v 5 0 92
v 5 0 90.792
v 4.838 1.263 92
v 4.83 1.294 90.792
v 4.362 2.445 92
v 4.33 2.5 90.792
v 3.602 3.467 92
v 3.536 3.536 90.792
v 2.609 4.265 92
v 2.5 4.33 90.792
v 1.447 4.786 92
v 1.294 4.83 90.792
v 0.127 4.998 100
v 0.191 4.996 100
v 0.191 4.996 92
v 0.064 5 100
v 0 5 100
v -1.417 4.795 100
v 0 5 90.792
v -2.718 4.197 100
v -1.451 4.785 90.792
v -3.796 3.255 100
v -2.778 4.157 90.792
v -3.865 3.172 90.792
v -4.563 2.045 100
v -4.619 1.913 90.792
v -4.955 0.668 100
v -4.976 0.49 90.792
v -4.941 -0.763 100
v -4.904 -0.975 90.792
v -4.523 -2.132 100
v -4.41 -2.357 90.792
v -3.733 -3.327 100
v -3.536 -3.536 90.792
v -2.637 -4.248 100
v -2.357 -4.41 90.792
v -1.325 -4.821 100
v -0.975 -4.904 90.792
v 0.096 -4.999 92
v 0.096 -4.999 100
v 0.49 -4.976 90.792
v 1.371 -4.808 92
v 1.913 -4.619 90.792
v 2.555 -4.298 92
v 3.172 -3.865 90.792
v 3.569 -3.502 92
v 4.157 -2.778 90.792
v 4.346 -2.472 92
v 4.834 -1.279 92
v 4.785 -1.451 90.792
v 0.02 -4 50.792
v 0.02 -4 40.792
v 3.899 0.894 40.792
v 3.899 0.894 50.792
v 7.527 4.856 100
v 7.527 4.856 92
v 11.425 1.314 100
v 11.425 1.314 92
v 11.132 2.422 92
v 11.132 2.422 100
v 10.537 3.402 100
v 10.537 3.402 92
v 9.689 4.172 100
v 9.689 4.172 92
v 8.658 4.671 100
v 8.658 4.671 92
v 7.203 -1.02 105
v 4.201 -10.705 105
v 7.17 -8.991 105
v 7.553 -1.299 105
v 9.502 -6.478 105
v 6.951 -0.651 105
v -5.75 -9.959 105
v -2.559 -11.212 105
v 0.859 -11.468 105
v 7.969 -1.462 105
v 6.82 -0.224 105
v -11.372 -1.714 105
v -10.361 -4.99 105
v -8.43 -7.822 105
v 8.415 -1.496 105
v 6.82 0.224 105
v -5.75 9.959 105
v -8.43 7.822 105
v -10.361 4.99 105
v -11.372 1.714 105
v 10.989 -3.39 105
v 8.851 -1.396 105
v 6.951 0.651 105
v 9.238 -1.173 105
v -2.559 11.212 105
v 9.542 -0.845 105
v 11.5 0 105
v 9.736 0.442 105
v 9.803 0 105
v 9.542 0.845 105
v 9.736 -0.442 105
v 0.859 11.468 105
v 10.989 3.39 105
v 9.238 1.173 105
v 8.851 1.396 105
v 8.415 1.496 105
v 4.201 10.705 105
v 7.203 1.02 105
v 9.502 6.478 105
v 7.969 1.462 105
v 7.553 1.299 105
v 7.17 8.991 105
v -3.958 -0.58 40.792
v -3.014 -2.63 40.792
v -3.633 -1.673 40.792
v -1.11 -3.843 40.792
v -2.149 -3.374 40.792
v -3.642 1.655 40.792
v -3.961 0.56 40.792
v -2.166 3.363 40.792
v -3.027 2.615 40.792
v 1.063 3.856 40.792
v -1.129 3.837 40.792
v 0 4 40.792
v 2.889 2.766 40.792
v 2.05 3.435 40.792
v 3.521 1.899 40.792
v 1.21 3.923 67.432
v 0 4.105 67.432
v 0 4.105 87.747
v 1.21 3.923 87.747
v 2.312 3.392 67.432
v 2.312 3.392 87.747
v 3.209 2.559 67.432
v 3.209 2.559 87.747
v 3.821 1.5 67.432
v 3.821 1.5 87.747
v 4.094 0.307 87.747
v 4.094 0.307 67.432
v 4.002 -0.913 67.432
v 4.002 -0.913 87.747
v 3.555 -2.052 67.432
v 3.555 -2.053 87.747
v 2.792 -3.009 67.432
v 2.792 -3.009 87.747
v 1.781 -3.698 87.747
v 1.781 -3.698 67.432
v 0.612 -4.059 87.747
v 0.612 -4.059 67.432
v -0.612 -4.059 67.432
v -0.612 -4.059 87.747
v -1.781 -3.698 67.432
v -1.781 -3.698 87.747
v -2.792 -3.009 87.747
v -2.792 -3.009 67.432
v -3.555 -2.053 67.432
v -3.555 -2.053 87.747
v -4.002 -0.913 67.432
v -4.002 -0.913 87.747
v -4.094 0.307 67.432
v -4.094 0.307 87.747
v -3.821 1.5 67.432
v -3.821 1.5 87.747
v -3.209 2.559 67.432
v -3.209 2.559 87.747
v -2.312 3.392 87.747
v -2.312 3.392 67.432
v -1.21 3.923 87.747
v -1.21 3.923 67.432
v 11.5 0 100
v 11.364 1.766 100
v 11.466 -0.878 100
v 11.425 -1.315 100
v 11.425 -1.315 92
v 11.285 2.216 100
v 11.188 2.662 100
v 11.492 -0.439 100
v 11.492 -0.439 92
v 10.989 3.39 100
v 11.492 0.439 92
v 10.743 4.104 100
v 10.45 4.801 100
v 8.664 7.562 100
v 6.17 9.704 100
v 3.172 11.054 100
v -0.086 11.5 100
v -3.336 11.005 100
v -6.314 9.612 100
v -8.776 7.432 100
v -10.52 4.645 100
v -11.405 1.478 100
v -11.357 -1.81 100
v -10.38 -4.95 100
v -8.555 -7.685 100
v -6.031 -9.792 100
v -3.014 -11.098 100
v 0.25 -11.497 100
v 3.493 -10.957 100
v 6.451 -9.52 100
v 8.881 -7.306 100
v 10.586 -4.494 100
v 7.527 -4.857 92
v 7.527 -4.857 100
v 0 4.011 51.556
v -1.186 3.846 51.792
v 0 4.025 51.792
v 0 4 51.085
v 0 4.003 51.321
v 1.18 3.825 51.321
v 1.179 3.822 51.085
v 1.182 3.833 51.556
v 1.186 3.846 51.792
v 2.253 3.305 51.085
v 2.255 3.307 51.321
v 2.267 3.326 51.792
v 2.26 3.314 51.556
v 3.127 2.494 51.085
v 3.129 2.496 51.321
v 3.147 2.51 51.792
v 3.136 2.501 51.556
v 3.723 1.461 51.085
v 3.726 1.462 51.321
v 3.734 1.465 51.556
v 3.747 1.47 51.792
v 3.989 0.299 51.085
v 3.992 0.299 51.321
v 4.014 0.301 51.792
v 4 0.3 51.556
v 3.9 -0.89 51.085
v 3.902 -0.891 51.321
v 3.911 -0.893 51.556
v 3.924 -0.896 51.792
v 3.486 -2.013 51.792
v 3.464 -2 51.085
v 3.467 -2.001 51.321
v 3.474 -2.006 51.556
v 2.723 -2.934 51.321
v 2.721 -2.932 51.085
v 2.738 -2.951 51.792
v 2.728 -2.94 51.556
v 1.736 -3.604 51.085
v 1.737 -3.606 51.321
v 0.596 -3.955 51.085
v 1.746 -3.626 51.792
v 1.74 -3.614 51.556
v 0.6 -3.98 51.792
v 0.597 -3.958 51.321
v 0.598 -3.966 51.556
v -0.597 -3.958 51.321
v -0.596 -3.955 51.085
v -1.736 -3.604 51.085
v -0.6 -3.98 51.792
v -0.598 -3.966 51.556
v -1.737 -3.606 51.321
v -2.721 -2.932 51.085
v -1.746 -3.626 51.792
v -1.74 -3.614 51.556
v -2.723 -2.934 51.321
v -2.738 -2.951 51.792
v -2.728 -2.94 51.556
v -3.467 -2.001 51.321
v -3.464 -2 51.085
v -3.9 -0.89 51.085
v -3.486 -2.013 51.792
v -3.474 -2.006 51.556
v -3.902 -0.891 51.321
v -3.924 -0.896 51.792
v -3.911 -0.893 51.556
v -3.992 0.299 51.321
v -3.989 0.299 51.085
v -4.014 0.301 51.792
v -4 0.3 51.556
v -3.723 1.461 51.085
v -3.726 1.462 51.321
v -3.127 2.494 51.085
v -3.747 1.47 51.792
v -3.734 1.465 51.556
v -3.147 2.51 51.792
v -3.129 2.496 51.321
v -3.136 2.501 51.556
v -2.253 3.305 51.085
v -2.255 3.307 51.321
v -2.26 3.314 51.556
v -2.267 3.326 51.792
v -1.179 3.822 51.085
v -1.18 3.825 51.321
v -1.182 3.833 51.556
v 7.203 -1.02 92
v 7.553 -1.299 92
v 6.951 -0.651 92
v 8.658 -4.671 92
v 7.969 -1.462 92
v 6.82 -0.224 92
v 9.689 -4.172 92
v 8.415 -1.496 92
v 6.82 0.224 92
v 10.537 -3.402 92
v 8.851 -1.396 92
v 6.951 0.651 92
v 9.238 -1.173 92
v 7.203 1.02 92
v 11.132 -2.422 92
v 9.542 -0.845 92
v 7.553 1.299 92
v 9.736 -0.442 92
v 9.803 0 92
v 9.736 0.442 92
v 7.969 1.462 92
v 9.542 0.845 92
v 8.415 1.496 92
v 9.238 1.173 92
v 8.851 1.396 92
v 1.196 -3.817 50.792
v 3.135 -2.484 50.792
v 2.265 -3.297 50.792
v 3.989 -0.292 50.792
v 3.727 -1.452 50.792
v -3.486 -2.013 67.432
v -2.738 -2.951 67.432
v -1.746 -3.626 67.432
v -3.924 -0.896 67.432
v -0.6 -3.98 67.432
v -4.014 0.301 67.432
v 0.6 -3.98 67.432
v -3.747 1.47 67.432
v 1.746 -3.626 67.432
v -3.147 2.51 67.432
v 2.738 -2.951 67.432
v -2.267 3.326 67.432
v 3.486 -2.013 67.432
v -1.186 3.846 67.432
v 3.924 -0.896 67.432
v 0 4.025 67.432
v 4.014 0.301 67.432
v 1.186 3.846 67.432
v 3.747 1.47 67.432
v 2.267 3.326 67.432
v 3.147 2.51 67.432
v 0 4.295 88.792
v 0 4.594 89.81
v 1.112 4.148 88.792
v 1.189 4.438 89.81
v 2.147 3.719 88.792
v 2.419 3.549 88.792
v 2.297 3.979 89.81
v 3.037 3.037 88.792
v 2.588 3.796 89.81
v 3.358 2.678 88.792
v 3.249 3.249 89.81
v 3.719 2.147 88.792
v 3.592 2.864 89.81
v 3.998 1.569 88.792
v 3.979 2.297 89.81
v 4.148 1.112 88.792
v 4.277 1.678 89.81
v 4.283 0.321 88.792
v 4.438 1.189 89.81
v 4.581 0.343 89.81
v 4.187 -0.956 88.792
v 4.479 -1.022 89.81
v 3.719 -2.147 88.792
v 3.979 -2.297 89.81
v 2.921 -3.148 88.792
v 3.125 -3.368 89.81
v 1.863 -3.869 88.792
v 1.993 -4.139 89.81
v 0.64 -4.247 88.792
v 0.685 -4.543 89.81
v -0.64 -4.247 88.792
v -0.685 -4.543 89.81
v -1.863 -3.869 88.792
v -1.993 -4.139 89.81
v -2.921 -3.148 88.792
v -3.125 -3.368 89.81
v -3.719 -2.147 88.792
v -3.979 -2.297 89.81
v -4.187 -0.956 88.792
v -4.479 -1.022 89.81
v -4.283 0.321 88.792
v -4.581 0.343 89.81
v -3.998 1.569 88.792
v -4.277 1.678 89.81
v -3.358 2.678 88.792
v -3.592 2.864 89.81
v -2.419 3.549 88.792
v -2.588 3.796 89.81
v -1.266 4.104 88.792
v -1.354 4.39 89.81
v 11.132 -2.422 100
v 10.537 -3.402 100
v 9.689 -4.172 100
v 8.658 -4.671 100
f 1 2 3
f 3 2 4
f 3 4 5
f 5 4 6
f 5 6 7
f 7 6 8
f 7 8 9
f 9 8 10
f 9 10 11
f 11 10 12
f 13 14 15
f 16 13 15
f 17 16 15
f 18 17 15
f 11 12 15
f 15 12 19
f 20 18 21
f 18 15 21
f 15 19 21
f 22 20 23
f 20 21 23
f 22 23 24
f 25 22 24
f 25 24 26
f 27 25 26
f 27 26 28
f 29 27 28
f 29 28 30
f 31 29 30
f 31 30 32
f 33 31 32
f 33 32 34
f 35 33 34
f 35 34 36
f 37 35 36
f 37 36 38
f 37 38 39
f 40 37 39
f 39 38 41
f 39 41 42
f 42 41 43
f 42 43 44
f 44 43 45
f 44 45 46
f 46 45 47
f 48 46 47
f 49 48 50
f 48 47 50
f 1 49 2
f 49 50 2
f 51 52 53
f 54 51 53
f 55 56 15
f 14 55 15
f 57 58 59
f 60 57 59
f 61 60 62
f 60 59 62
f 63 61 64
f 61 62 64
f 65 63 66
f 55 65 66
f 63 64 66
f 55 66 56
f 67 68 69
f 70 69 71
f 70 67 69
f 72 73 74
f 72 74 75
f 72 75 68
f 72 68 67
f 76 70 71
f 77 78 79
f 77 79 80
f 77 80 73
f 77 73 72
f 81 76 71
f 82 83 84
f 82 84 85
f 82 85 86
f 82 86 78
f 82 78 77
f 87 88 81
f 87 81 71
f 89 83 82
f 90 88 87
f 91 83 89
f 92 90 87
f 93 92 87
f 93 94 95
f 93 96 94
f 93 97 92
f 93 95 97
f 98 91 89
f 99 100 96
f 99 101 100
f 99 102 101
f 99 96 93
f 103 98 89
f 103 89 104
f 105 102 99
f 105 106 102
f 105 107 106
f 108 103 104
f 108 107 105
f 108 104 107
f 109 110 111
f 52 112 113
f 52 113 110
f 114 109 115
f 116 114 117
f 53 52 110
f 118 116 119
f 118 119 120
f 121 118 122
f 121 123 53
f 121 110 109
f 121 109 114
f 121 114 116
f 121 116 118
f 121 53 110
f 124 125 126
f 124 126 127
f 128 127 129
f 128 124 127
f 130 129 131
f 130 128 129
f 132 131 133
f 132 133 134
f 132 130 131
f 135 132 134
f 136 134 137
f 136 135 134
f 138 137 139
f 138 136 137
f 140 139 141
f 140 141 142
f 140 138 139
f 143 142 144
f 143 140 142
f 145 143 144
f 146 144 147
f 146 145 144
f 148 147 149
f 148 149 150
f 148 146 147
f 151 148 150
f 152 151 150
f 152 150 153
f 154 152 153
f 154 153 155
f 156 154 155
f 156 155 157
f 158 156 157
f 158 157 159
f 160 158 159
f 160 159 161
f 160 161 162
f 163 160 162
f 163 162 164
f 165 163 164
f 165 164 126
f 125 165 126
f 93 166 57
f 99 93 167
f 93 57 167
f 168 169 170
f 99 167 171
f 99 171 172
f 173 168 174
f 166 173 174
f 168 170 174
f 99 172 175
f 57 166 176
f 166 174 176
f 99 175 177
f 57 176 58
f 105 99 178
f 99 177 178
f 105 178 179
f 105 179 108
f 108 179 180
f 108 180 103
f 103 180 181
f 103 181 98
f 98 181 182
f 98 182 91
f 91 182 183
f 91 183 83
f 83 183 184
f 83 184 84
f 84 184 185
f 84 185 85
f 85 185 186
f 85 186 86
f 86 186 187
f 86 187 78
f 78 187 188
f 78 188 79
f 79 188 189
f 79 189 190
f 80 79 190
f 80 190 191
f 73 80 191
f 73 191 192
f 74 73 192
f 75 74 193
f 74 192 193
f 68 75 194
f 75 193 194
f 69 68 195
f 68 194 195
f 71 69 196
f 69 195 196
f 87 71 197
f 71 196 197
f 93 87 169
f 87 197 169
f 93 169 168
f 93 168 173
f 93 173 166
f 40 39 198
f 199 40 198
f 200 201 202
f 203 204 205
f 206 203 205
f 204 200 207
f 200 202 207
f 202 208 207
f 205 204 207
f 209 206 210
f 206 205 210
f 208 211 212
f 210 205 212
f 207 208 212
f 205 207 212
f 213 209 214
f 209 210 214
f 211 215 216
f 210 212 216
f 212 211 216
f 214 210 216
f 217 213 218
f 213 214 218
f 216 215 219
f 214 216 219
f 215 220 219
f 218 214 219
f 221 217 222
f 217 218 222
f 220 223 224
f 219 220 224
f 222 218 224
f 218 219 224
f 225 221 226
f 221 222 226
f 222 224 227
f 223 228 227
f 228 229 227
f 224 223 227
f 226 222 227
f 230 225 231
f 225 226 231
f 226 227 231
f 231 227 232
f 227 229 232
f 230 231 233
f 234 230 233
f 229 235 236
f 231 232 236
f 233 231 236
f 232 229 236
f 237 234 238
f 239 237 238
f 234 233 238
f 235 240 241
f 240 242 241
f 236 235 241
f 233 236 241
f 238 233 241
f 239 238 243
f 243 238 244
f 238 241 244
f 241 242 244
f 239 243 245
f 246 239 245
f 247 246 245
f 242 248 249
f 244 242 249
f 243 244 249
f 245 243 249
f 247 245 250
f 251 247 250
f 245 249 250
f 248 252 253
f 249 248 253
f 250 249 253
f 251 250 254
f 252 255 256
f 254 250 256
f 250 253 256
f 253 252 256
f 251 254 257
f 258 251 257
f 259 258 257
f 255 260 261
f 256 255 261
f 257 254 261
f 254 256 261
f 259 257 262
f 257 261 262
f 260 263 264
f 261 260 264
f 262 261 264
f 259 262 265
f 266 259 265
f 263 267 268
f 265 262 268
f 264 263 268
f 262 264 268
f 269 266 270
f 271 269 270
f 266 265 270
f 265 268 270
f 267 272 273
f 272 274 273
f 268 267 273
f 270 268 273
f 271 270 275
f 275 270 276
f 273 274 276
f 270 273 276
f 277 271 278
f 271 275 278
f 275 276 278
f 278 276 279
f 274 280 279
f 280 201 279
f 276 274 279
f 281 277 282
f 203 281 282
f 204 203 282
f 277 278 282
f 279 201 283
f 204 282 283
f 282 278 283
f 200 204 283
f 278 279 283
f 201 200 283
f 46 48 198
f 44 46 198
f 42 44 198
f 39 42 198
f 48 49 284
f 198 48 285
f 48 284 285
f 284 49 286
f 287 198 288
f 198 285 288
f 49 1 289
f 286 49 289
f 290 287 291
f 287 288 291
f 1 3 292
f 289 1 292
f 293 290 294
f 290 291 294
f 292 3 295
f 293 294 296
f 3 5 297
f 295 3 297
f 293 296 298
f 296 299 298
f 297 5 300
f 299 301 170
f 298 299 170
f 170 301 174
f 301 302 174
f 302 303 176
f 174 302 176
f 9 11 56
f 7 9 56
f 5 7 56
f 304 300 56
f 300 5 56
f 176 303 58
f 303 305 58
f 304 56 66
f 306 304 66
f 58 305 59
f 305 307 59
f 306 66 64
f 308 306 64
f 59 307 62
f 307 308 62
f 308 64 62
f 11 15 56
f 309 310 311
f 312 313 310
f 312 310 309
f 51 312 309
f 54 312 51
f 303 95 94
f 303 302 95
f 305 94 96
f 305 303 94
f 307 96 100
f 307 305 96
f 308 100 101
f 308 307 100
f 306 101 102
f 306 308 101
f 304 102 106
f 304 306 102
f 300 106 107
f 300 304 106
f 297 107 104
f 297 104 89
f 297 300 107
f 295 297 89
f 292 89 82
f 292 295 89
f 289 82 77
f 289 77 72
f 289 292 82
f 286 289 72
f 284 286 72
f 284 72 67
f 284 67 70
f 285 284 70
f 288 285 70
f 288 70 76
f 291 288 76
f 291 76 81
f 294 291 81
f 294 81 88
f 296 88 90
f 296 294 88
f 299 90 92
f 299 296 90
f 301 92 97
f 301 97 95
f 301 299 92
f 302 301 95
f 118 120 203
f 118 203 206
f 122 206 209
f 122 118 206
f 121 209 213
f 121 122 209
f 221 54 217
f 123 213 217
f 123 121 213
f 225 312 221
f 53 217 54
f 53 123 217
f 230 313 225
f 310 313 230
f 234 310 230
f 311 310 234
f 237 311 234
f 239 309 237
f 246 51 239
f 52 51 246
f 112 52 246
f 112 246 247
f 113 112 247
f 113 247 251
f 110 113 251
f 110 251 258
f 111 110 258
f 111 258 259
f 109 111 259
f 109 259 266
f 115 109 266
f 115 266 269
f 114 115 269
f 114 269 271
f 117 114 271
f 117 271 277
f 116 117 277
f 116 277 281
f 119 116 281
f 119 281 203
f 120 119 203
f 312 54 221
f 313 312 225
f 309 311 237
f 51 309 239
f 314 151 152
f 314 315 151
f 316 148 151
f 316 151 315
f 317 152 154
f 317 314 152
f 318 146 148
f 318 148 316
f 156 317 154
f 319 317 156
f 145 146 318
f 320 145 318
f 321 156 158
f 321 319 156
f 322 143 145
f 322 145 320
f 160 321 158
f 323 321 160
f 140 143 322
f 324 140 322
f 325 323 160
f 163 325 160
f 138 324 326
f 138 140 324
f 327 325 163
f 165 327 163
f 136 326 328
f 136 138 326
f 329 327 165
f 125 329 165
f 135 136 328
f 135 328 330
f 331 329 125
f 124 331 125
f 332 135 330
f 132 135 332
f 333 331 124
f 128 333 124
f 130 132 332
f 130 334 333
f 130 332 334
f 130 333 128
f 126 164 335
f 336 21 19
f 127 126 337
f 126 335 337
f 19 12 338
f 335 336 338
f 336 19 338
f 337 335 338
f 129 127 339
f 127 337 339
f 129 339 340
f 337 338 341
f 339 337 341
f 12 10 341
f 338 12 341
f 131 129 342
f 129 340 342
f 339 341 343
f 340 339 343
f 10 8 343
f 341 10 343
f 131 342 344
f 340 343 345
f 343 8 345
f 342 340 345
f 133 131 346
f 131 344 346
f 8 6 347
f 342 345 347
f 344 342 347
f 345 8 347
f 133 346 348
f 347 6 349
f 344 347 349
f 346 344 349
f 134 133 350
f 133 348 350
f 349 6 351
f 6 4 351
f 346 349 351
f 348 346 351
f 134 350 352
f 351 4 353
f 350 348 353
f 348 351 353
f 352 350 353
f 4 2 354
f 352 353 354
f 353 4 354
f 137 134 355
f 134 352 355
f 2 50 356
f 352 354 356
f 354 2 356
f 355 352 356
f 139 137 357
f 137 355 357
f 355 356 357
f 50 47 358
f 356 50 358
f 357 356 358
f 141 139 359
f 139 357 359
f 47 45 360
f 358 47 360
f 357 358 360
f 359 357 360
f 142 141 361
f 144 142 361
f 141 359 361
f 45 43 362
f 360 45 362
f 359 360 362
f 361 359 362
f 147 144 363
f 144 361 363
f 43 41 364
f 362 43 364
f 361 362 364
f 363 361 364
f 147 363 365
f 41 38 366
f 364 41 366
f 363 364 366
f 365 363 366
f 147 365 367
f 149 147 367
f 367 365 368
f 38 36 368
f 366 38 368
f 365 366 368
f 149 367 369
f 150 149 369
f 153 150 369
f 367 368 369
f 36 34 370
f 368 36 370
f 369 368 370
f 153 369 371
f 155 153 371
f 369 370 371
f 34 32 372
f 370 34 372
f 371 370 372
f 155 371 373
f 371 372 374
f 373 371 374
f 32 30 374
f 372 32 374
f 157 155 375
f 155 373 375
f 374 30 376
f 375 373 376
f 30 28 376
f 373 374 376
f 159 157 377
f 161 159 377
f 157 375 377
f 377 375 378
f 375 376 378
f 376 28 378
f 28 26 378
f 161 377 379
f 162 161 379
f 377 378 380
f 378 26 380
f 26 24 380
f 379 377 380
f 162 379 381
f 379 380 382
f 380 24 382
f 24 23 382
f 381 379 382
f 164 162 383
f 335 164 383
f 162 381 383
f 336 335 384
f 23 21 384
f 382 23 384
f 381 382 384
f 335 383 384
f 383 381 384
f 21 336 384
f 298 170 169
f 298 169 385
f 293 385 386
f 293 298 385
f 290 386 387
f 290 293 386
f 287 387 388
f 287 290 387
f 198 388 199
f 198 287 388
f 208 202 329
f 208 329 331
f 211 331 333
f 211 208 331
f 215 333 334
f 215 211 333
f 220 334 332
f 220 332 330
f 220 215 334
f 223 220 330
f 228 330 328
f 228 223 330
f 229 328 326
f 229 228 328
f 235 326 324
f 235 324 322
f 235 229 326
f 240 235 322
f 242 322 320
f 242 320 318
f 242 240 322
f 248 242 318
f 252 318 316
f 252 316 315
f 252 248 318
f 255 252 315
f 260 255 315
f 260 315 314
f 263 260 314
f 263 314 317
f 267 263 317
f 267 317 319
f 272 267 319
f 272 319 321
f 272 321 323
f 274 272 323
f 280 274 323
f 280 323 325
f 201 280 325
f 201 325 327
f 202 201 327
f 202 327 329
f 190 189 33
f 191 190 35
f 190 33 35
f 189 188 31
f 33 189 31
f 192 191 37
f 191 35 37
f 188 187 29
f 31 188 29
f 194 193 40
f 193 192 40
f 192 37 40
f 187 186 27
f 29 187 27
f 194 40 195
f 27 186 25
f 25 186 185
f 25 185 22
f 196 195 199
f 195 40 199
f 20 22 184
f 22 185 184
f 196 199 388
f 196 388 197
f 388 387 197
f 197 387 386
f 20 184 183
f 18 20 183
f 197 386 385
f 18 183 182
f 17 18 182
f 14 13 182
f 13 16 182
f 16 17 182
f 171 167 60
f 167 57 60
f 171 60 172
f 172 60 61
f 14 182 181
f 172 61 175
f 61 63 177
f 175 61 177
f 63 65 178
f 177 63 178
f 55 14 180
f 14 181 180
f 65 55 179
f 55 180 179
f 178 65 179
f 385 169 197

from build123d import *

# Parameters (mm, degrees)
SKETCH1_R               = 5
BOSS_EXTRUDE1_DEPTH     = 100
SKETCH2_R               = 11.5
BOSS_EXTRUDE2_DEPTH     = 5
SKETCH3_R               = 1.5
BOSS_EXTRUDE3_DEPTH     = 5
BOSS_EXTRUDE4_START     = 8
BOSS_EXTRUDE4_DEPTH     = 8
CUT_EXTRUDE2_DEPTH      = 8
CUT_EXTRUDE4_DEPTH      = 134.839635872
CUT_EXTRUDE4_DEPTH_BACK = 134.839635872
SKETCH7_W               = 13.423809299
SKETCH7_H               = 65.791523209
CUT_EXTRUDE5_DEPTH      = 48.105089111
CUT_EXTRUDE5_DEPTH_BACK = 48.105089111
SKETCH8_R               = 1.5
SKETCH9_R               = 5
SKETCH9_R_2             = 4.025
CUT_EXTRUDE6_DEPTH      = 25
FILLET1_R               = 10
BOSS_EXTRUDE5_START     = 25
SKETCH10_R              = 4.025
BOSS_EXTRUDE5_DEPTH     = 25
CUT_EXTRUDE7_DEPTH      = 10
SKETCH12_R              = 4.025
SKETCH12_R_2            = 4
CUT_EXTRUDE8_DEPTH      = 11
FILLET2_R               = 10
SKETCH13_R              = 4.105
SKETCH13_R_2            = 4.025
BOSS_EXTRUDE6_DEPTH     = 20
BOSS_EXTRUDE7_START     = 5
SKETCH14_R              = 4.105
BOSS_EXTRUDE7_DEPTH     = 5


with BuildPart() as part:
    # Sketch1 → Boss-Extrude1 (new body)
    with BuildSketch(Plane.XY):
        Circle(SKETCH1_R)
    extrude(amount=BOSS_EXTRUDE1_DEPTH)

    # Sketch2 → Boss-Extrude2 (add)
    with BuildSketch(Plane.XY.offset(100)):
        Circle(SKETCH2_R)
    extrude(amount=BOSS_EXTRUDE2_DEPTH)

    # Sketch3 → Boss-Extrude3 (add)
    with BuildSketch(Plane.XY.offset(105)):
        with Locations((8.302947015, 0)):
            Circle(SKETCH3_R)
    extrude(amount=BOSS_EXTRUDE3_DEPTH)

    # Sketch5 → Boss-Extrude4 (add)
    with BuildSketch(Plane(origin=(0, 0, 100), x_dir=(-1, 0, 0), z_dir=(0, 0, -1)).offset(BOSS_EXTRUDE4_START)):
        with BuildLine():
            Line((-10.45001903, 4.800739762), (0, 5))
            ThreePointArc((0, 5), (4.99977072, -0.04788268), (-0.095760969, -4.9990829))
            Line((-0.095760969, -4.9990829), (-10.45001903, -4.800739762))
            ThreePointArc((-10.45001903, -4.800739762), (-11.5, 0), (-10.45001903, 4.800739762))
        make_face()
    extrude(amount=-BOSS_EXTRUDE4_DEPTH)

    # Sketch6 → Cut-Extrude2 (cut)
    with BuildSketch(Plane(origin=(0, 0, 92), x_dir=(-1, 0, 0), z_dir=(0, 0, -1))):
        with BuildLine():
            ThreePointArc((-11.187749919, 2.661625773), (-11.326245042, 1.991525355), (-11.424640936, 1.314374177))
            ThreePointArc((-11.424640936, 1.314374177), (-10.141082355, 3.817380419), (-7.527110609, 4.856473577))
            Line((-7.527110609, 4.856473577), (-10.45001903, 4.800739762))
            ThreePointArc((-10.45001903, 4.800739762), (-10.871624232, 3.749371489), (-11.187749919, 2.661625773))
        make_face()
        with BuildLine():
            ThreePointArc((-11.424595573, -1.314768419), (-10.141131578, -3.817565911), (-7.527431975, -4.856723984))
            Line((-7.527431975, -4.856723984), (-10.45001903, -4.800739762))
            ThreePointArc((-10.45001903, -4.800739762), (-11.07531896, -3.09633815), (-11.424595573, -1.314768419))
        make_face()
    extrude(amount=-CUT_EXTRUDE2_DEPTH, mode=Mode.SUBTRACT)

    # Sketch7 → Cut-Extrude4 (cut, two sides: drawn at the far end of the back side and taken through both)
    with BuildSketch(Plane(origin=(-96.480203858, -4.620399557, 77.417416795), x_dir=(0.40721461787547164, -0.9133324996892062, 6.240488345448587e-15), z_dir=(0.9133324996892062, 0.40721461787547164, -3.9305527970726e-15)).offset(-CUT_EXTRUDE4_DEPTH_BACK)):
        with Locations((36.58009292, 44.521655191)):
            Rectangle(SKETCH7_W, SKETCH7_H)
    extrude(amount=CUT_EXTRUDE4_DEPTH + CUT_EXTRUDE4_DEPTH_BACK, mode=Mode.SUBTRACT)

    # Sketch8 → Cut-Extrude5 (cut, two sides: drawn at the far end of the back side and taken through both)
    with BuildSketch(Plane.XY.offset(110).offset(-CUT_EXTRUDE5_DEPTH_BACK)):
        with Locations((8.302947015, 0)):
            Circle(SKETCH8_R)
    extrude(amount=CUT_EXTRUDE5_DEPTH + CUT_EXTRUDE5_DEPTH_BACK, mode=Mode.SUBTRACT)

    # Sketch9 → Cut-Extrude6 (cut)
    with BuildSketch(Plane(origin=(0, 0, 65.791523209), x_dir=(-1, 0, 0), z_dir=(0, 0, -1))):
        with Locations(Location((0, 0, 0), (0, 0, 90))):
            Circle(SKETCH9_R)
        with Locations(Location((0, 0, 0), (0, 0, 90))):
            Circle(SKETCH9_R_2, mode=Mode.SUBTRACT)
    extrude(amount=-CUT_EXTRUDE6_DEPTH, mode=Mode.SUBTRACT)

    # Fillet1
    # the kernel refuses this fillet: 10 mm, written as the material it adds along each edge
    with BuildSketch(Plane(origin=(0, 0, 90.791523209), x_dir=(0, 1, 0), z_dir=(-1, 0, 0))) as fillet1_piece_1:
        with BuildLine():
            CenterArc((14.025, 4.306898536), FILLET1_R, 180, 25.511347951)
            Line((4.025, 4.306898536), (3.825, 4.306898536))
            Line((3.825, 4.306898536), (3.825, 0))
            Line((3.825, 0), (4.025, -0.2))
            ThreePointArc((4.025, -0.2), (4.5125, -0.2), (4.8195, -0.086137971))
            Line((4.8195, -0.086137971), (5, 0))
        make_face()
    revolve(axis=Axis((0, 0, 90.791523209), (0, 0, -1)))

    # Sketch10 → Boss-Extrude5 (add)
    with BuildSketch(Plane(origin=(0, 0, 65.791523209), x_dir=(-1, 0, 0), z_dir=(0, 0, -1)).offset(BOSS_EXTRUDE5_START)):
        with Locations(Location((0, 0, 0), (0, 0, 90))):
            Circle(SKETCH10_R)
    extrude(amount=-BOSS_EXTRUDE5_DEPTH)

    # Sketch11 → Cut-Extrude7 (cut)
    with BuildSketch(Plane(origin=(0, 0, 40.791523209), x_dir=(-1, 0, 0), z_dir=(0, 0, -1))):
        with BuildLine():
            Line((0, -4.025), (-3.918585251, 0.919409938))
            ThreePointArc((-3.918585251, 0.919409938), (-3.154461127, -2.5), (0, -4.025))
        make_face()
    extrude(amount=-CUT_EXTRUDE7_DEPTH, mode=Mode.SUBTRACT)

    # Sketch12 → Cut-Extrude8 (cut)
    with BuildSketch(Plane(origin=(0, 0, 40.791523209), x_dir=(-1, 0, 0), z_dir=(0, 0, -1))):
        with Locations(Location((0, 0, 0), (0, 0, 90))):
            Circle(SKETCH12_R)
        with Locations(Location((0, 0, 0), (0, 0, 90))):
            Circle(SKETCH12_R_2, mode=Mode.SUBTRACT)
    extrude(amount=-CUT_EXTRUDE8_DEPTH, mode=Mode.SUBTRACT)

    # Fillet2
    # the kernel refuses this fillet: 10 mm, written as the material it adds along each edge
    with BuildSketch(Plane(origin=(0, 0, 51.791523209), x_dir=(0, 1, 0), z_dir=(-1, 0, 0))) as fillet2_piece_1:
        with BuildLine():
            CenterArc((14, 0.706664701), FILLET2_R, 180, 4.052267945)
            Line((4, 0.706664701), (4, 0))
            Line((4, 0), (4.025, 0))
        make_face()
    revolve(axis=Axis((0, 0, 51.791523209), (0, 0, -1)))

    # Sketch13 → Boss-Extrude6 (add)
    with BuildSketch(Plane(origin=(0, 0, 72.432039474), x_dir=(-1, 0, 0), z_dir=(0, 0, -1))):
        with Locations(Location((0, 0, 0), (0, 0, 90))):
            Circle(SKETCH13_R)
        with Locations(Location((0, 0, 0), (0, 0, 90))):
            Circle(SKETCH13_R_2, mode=Mode.SUBTRACT)
    extrude(amount=-BOSS_EXTRUDE6_DEPTH)

    # Sketch14 → Boss-Extrude7 (add)
    with BuildSketch(Plane(origin=(0, 0, 72.432039474), x_dir=(-1, 0, 0), z_dir=(0, 0, -1)).offset(BOSS_EXTRUDE7_START)):
        with Locations(Location((0, 0, 0), (0, 0, 90))):
            Circle(SKETCH14_R)
    extrude(amount=-BOSS_EXTRUDE7_DEPTH)


solid = part.part
